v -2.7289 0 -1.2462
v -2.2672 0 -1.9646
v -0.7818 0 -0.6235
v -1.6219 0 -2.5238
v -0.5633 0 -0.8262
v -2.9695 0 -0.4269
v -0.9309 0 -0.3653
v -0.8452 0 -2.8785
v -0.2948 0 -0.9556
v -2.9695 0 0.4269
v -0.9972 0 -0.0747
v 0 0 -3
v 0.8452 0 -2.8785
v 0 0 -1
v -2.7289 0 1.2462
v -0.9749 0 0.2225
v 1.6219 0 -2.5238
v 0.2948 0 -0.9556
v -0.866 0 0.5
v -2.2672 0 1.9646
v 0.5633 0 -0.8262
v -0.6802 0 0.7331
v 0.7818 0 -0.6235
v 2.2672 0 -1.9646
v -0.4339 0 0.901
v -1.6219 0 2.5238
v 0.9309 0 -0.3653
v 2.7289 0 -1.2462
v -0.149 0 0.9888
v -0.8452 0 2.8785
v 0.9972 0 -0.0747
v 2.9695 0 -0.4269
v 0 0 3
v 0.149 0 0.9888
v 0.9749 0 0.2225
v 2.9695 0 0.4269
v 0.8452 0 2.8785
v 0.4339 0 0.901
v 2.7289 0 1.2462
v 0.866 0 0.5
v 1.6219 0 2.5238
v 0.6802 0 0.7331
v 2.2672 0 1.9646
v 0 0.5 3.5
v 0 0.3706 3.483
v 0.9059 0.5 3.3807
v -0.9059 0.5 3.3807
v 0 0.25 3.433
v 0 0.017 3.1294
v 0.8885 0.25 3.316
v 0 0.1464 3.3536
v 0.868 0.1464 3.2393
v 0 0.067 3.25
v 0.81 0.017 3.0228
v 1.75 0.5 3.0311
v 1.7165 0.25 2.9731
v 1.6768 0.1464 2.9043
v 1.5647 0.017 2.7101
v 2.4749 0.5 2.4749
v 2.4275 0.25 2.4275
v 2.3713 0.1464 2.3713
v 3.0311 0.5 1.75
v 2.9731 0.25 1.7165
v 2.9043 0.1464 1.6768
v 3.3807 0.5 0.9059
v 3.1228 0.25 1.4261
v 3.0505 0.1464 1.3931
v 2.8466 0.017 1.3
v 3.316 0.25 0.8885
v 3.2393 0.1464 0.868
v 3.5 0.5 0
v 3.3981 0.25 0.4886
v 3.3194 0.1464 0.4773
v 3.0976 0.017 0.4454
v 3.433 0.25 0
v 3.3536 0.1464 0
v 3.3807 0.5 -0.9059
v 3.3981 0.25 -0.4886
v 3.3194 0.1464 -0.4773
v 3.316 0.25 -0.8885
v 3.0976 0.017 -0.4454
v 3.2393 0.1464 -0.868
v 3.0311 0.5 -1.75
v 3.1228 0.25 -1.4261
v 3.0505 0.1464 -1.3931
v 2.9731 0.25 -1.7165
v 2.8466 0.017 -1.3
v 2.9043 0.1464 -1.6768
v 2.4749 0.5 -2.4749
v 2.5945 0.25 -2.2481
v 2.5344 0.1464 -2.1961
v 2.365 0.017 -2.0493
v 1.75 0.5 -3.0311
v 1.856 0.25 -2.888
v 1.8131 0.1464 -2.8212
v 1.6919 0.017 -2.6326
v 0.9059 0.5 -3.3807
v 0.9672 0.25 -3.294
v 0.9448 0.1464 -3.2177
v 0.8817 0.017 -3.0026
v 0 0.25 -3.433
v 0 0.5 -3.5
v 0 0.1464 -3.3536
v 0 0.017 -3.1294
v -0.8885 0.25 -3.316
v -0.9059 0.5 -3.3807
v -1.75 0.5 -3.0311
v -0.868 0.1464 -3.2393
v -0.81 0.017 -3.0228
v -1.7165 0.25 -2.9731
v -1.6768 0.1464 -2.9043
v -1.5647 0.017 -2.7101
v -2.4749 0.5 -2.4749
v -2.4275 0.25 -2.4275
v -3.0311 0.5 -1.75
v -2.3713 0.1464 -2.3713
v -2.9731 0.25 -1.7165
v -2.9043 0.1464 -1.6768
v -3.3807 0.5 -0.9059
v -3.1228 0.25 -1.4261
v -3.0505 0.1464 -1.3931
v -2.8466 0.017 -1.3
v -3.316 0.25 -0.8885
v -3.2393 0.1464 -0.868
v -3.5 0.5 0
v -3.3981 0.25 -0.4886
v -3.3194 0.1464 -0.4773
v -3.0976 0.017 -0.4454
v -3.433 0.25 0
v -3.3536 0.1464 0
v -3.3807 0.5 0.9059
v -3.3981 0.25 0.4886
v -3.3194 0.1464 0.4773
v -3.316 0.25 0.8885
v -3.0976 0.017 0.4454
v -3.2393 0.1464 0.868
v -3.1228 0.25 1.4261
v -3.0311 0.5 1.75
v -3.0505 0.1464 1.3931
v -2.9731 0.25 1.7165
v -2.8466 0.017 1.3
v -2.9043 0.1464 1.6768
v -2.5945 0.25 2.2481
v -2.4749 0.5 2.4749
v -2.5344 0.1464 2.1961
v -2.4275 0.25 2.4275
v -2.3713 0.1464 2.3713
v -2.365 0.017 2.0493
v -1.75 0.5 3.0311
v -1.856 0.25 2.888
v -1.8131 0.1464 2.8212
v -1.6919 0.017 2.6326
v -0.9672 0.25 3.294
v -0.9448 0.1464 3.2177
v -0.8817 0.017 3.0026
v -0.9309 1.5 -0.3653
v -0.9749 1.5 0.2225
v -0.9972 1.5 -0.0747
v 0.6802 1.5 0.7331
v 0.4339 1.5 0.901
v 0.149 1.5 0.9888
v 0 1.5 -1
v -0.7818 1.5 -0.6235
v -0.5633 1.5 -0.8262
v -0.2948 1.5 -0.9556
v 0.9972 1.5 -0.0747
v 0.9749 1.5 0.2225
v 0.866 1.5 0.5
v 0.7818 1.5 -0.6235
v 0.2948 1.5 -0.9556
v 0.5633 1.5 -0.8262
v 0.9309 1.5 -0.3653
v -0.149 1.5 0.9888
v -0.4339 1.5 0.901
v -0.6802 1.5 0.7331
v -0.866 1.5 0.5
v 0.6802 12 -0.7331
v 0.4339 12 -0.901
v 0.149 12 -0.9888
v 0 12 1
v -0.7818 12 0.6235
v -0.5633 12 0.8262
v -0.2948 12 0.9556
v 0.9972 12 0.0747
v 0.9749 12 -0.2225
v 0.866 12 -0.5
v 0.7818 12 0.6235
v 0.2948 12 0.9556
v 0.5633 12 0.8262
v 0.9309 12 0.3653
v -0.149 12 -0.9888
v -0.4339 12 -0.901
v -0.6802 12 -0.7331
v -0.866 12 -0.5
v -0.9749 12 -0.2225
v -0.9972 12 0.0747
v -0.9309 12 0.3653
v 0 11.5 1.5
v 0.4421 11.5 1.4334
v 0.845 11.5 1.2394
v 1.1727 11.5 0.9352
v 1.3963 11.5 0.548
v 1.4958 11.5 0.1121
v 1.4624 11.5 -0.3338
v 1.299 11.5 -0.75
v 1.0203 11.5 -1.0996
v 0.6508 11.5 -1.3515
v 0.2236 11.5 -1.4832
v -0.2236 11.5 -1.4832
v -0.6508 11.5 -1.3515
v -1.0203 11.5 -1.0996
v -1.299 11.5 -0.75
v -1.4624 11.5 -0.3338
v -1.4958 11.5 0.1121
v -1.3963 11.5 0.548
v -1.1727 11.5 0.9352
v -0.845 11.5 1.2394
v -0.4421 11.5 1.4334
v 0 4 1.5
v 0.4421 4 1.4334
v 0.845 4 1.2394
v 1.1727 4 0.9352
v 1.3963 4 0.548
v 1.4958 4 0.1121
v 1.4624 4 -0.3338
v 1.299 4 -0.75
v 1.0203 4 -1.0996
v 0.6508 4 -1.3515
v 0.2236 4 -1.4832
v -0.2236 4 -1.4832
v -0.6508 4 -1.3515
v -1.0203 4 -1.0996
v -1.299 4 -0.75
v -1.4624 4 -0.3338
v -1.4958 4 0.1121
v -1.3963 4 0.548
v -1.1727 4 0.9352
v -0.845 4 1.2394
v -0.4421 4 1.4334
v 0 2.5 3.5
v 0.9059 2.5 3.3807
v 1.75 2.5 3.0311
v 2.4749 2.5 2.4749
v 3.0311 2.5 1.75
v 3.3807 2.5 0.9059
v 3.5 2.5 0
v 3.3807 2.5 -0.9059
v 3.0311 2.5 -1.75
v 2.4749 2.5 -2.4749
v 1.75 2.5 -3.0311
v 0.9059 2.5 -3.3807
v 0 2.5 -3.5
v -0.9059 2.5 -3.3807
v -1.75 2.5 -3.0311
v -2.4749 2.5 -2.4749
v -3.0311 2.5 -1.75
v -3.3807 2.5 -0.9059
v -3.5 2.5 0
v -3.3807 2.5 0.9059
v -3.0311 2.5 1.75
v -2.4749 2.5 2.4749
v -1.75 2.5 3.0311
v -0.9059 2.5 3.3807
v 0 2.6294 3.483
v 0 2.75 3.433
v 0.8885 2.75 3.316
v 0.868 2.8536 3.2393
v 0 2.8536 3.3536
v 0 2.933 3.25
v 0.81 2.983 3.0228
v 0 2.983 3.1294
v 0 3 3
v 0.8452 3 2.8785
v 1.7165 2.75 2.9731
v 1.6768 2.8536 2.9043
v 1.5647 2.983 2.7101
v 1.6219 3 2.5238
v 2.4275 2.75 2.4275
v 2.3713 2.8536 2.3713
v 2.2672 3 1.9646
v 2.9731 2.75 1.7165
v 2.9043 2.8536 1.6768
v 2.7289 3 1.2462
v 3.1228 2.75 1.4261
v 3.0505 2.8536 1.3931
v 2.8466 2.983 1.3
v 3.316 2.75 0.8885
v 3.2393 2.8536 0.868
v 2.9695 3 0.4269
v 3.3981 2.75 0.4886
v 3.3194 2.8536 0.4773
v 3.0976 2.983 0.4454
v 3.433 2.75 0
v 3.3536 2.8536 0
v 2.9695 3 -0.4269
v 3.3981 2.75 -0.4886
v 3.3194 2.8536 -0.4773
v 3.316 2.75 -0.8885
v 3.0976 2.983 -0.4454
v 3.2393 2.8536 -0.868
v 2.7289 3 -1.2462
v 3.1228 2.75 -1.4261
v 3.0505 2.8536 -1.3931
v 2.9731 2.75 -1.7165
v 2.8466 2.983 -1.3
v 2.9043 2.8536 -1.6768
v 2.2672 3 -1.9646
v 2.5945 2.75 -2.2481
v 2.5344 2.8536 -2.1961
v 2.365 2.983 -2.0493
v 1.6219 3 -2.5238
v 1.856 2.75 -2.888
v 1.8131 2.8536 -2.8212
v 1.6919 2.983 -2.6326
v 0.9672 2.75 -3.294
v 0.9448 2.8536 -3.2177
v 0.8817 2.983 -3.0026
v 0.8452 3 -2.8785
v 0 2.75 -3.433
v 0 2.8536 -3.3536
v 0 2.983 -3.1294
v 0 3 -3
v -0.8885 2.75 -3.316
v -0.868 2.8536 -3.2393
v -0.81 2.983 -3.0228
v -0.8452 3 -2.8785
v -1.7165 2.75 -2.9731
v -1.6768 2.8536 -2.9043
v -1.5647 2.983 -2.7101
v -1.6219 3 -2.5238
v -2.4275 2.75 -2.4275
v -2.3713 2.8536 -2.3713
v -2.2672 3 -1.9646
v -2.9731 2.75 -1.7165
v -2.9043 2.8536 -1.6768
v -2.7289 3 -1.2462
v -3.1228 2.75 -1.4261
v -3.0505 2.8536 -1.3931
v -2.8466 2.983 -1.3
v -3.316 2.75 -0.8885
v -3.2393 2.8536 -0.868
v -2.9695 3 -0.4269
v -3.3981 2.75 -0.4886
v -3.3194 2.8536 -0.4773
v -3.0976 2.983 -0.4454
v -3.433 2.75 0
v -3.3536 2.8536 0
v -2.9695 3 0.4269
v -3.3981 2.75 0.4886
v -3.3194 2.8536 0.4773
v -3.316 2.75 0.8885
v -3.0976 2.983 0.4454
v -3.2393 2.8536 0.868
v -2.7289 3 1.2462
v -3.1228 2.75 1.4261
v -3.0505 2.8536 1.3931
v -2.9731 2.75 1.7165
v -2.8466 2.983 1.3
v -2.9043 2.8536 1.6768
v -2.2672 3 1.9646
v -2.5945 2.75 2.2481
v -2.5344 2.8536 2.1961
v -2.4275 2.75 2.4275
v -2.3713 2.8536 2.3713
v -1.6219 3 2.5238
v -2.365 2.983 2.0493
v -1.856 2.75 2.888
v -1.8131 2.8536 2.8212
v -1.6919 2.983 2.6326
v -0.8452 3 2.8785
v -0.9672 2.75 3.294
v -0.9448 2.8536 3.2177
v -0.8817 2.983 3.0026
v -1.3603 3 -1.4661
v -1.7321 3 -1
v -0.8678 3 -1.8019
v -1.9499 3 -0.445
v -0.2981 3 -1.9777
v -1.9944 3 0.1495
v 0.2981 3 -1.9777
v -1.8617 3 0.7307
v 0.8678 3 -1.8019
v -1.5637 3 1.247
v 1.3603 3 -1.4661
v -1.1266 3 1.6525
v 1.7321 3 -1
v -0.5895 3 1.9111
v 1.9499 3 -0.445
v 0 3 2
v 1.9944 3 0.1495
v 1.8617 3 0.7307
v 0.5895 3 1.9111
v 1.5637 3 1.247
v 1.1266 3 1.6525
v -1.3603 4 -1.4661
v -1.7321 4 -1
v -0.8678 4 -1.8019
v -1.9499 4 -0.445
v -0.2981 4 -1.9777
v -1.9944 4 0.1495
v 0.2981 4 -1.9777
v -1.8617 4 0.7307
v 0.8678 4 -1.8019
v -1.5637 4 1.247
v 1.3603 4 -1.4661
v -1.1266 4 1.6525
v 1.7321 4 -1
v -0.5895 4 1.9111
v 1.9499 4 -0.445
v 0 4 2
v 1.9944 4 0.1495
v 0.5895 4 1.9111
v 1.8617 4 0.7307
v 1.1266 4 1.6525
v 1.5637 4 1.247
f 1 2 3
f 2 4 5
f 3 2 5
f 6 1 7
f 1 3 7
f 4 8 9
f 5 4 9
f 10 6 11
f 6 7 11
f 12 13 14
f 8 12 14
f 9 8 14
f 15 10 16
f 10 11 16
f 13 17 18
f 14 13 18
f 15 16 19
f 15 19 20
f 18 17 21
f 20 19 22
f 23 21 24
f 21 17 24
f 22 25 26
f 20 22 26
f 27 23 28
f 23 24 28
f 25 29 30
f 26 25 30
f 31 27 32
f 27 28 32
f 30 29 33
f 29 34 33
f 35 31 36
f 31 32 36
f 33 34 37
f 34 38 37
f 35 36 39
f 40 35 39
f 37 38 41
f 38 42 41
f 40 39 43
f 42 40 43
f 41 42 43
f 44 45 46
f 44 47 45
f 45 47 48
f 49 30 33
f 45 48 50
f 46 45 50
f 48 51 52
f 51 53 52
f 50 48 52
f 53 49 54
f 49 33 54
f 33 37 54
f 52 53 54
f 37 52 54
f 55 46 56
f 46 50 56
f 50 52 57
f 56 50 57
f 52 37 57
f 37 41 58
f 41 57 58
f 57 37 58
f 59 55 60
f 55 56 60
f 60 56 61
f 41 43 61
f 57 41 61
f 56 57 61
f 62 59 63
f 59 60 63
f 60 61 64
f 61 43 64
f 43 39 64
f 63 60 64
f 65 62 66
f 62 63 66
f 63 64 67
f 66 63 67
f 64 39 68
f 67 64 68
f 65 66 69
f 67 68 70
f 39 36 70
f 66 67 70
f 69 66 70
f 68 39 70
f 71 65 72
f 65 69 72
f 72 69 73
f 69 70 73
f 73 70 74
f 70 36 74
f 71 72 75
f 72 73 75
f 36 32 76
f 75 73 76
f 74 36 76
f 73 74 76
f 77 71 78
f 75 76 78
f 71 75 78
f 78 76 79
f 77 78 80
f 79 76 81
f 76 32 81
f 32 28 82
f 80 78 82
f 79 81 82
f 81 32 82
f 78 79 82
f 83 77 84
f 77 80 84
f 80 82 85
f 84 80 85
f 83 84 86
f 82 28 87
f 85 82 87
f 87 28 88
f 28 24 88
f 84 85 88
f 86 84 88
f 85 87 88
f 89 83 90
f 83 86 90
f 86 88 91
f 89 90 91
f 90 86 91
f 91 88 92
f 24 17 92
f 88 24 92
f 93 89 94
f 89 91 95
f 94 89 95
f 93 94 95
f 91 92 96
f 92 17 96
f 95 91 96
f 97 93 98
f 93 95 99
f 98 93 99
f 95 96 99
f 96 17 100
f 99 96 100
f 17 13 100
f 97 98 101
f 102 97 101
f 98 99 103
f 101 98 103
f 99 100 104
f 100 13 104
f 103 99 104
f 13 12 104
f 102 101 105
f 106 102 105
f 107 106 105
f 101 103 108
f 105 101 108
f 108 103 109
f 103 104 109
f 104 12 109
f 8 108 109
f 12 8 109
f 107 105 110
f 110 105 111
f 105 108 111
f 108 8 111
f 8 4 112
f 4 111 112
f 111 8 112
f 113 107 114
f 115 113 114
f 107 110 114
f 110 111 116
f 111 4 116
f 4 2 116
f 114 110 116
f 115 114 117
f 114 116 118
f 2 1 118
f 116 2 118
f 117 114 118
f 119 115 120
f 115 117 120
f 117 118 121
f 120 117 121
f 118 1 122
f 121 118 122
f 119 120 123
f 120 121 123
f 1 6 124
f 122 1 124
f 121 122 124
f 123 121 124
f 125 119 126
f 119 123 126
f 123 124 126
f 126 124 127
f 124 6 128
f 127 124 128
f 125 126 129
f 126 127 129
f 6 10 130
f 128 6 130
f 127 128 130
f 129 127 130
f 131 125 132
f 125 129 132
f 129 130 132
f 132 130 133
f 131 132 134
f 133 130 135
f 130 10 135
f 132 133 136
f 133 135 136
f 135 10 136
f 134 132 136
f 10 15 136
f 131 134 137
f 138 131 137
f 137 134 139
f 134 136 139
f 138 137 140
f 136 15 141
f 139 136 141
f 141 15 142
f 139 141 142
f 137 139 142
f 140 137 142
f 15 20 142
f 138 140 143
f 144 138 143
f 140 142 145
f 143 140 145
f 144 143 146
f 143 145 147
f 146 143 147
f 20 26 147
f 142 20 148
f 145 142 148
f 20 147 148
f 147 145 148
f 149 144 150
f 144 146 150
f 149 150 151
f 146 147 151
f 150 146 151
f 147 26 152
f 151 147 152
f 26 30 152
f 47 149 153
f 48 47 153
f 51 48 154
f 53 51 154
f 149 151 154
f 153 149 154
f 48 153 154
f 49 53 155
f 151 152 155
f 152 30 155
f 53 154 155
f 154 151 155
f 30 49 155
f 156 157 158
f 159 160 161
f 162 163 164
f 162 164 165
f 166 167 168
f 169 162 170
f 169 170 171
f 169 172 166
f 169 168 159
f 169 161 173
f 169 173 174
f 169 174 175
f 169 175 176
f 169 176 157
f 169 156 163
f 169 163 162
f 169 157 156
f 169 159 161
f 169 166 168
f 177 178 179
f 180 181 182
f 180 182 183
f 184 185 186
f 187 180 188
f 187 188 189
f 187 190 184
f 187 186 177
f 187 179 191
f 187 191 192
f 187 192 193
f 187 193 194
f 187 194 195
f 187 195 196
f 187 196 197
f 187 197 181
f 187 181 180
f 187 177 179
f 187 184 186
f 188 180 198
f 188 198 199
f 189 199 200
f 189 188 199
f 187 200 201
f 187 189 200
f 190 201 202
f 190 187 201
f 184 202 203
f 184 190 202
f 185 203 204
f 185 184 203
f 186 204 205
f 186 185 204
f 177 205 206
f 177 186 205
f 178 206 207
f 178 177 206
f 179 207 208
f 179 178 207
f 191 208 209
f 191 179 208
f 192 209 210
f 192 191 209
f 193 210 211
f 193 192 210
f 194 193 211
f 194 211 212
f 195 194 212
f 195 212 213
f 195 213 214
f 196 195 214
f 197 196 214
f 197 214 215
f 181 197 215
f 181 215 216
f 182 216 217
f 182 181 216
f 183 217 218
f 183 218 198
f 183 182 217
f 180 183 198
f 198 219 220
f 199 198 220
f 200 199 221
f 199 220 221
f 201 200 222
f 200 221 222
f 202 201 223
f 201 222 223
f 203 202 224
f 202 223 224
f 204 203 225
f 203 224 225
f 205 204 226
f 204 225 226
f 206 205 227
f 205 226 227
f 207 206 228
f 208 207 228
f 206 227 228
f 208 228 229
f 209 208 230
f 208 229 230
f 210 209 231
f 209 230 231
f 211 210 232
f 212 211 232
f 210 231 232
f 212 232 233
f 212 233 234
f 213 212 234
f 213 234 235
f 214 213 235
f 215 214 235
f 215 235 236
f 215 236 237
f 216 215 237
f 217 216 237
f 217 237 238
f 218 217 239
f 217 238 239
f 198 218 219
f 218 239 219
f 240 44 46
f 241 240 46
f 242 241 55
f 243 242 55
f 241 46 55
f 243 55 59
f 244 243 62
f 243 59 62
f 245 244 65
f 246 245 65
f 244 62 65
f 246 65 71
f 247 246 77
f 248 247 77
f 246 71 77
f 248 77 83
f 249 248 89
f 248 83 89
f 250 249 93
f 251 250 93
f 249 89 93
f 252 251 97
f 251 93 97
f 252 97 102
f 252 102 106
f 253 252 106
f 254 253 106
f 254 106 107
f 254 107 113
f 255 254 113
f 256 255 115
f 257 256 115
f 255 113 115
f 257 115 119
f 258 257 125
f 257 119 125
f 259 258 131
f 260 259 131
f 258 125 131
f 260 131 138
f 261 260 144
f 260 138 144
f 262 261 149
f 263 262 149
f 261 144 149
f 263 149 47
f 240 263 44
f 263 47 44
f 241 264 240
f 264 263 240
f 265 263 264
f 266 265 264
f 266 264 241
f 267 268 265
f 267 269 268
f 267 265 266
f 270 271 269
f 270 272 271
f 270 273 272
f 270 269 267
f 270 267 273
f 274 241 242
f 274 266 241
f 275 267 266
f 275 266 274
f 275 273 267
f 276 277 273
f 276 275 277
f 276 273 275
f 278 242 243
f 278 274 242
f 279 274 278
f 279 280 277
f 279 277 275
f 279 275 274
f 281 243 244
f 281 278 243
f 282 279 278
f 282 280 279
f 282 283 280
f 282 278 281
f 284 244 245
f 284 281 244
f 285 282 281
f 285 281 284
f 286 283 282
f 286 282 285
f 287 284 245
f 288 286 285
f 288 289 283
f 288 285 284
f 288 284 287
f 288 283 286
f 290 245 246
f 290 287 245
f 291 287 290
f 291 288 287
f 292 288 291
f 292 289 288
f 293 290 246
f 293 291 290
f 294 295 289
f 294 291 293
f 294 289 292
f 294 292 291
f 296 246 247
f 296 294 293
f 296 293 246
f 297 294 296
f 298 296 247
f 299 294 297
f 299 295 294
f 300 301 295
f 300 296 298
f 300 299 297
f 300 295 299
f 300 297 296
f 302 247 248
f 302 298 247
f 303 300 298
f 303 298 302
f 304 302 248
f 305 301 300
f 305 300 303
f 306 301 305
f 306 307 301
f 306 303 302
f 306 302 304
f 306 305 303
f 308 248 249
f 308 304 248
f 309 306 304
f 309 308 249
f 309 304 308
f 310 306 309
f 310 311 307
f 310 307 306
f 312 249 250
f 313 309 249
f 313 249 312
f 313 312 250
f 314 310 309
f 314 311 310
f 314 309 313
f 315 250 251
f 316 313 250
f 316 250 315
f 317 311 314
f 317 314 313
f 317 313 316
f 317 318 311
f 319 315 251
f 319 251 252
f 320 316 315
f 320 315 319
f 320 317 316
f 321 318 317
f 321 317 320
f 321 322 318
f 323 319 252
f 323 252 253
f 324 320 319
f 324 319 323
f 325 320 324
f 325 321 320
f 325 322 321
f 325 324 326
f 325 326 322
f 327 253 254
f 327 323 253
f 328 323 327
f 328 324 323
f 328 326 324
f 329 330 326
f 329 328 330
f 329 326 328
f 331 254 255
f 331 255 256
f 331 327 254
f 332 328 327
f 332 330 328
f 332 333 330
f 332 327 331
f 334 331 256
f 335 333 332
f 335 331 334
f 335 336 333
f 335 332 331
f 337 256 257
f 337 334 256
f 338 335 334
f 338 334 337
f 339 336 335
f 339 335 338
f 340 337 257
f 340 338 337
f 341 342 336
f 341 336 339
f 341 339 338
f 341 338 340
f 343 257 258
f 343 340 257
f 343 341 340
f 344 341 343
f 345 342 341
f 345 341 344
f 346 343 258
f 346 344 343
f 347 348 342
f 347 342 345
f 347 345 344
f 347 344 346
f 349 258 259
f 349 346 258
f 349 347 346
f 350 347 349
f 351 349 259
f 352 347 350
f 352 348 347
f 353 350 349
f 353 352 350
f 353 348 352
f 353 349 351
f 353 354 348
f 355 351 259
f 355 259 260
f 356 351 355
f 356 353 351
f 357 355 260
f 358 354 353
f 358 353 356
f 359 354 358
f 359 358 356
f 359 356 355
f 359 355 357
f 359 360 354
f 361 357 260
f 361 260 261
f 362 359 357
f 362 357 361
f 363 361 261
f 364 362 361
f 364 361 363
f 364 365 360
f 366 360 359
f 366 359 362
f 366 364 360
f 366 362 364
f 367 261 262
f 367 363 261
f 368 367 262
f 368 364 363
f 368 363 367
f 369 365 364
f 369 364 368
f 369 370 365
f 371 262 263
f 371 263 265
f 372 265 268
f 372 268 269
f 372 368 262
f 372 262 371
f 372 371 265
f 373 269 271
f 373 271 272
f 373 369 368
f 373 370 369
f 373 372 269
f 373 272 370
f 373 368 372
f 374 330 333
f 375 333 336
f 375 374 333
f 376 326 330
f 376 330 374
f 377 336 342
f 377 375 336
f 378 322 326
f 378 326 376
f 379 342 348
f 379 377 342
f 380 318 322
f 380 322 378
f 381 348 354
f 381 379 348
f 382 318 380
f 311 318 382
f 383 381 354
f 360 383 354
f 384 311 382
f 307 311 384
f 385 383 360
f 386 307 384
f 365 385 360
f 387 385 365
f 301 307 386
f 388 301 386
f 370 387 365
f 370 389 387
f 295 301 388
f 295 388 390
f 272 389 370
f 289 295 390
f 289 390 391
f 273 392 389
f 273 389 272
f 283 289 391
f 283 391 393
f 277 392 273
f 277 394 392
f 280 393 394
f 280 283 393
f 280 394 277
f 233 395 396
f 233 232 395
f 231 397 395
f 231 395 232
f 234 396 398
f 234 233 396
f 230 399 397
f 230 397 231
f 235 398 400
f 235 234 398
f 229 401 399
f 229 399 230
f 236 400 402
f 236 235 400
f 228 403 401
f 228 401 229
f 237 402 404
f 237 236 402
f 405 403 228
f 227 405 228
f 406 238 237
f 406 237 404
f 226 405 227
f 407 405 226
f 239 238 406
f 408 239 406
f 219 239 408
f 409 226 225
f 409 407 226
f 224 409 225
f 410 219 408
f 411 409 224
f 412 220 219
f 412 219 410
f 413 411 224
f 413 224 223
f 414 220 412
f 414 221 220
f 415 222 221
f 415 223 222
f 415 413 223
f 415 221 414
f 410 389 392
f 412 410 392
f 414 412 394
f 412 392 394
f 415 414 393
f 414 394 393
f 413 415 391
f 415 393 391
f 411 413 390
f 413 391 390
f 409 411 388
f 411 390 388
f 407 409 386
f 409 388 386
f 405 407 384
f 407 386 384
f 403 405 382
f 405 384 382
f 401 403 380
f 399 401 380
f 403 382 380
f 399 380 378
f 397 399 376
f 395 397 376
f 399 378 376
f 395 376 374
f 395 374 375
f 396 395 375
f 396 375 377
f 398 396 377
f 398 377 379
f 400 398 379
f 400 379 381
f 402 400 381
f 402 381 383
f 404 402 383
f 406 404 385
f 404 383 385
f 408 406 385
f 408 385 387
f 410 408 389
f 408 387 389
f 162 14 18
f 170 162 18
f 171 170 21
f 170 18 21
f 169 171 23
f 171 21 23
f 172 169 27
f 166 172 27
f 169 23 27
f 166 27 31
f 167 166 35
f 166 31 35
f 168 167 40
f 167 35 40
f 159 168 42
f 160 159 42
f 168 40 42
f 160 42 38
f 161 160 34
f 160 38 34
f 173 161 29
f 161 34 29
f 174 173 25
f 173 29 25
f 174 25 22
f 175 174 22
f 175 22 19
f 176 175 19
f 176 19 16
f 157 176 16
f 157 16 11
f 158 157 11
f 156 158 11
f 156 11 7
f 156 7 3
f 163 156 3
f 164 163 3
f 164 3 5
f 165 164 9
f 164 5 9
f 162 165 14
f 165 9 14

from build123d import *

# Parameters (mm, degrees)
SKETCH_1_R          = 3.5
EXTRUDE_1_DEPTH     = 3
SKETCH_2_R          = 2
EXTRUDE_2_DEPTH     = 1
SKETCH_3_R          = 1.5
EXTRUDE_3_DEPTH     = 8
SKETCH_4_R          = 1
CUT_EXTRUDE_1_DEPTH = 1.5
FILLET_1_R          = 0.5
CHAMFER_1_SIZE      = 0.5


with BuildPart() as part:
    # 草图1 → 凸台-拉伸1 (new body)
    with BuildSketch(Plane(origin=(0, 0, 0), x_dir=(1, 0, 0), z_dir=(0, 1, 0))):
        with Locations(Location((0, 0, 0), (0, 0, 270))):
            Circle(SKETCH_1_R)
    extrude(amount=EXTRUDE_1_DEPTH)

    # 草图2 → 凸台-拉伸2 (add)
    with BuildSketch(Plane(origin=(0, 3, 0), x_dir=(1, 0, 0), z_dir=(0, 1, 0))):
        with Locations(Location((0, 0, 0), (0, 0, 270))):
            Circle(SKETCH_2_R)
    extrude(amount=EXTRUDE_2_DEPTH)

    # 草图3 → 凸台-拉伸3 (add)
    with BuildSketch(Plane(origin=(0, 4, 0), x_dir=(1, 0, 0), z_dir=(0, 1, 0))):
        with Locations(Location((0, 0, 0), (0, 0, 270))):
            Circle(SKETCH_3_R)
    extrude(amount=EXTRUDE_3_DEPTH)

    # 草图4 → 切除-拉伸1 (cut)
    with BuildSketch(Plane.XZ):
        with Locations(Location((0, 0, 0), (0, 0, 270))):
            Circle(SKETCH_4_R)
    extrude(amount=-CUT_EXTRUDE_1_DEPTH, mode=Mode.SUBTRACT)

    # 圆角1
    fillet_1_edges = [part.edges().sort_by_distance(p)[0] for p in [
        (0, 0, -3.5),
        (0, 3, -3.5),
    ]]
    fillet(fillet_1_edges, radius=FILLET_1_R)

    # 倒角1
    chamfer_1_edges = [part.edges().sort_by_distance(p)[0] for p in [
        (0, 12, -1.5),
    ]]
    chamfer(chamfer_1_edges, length=CHAMFER_1_SIZE)


solid = part.part
